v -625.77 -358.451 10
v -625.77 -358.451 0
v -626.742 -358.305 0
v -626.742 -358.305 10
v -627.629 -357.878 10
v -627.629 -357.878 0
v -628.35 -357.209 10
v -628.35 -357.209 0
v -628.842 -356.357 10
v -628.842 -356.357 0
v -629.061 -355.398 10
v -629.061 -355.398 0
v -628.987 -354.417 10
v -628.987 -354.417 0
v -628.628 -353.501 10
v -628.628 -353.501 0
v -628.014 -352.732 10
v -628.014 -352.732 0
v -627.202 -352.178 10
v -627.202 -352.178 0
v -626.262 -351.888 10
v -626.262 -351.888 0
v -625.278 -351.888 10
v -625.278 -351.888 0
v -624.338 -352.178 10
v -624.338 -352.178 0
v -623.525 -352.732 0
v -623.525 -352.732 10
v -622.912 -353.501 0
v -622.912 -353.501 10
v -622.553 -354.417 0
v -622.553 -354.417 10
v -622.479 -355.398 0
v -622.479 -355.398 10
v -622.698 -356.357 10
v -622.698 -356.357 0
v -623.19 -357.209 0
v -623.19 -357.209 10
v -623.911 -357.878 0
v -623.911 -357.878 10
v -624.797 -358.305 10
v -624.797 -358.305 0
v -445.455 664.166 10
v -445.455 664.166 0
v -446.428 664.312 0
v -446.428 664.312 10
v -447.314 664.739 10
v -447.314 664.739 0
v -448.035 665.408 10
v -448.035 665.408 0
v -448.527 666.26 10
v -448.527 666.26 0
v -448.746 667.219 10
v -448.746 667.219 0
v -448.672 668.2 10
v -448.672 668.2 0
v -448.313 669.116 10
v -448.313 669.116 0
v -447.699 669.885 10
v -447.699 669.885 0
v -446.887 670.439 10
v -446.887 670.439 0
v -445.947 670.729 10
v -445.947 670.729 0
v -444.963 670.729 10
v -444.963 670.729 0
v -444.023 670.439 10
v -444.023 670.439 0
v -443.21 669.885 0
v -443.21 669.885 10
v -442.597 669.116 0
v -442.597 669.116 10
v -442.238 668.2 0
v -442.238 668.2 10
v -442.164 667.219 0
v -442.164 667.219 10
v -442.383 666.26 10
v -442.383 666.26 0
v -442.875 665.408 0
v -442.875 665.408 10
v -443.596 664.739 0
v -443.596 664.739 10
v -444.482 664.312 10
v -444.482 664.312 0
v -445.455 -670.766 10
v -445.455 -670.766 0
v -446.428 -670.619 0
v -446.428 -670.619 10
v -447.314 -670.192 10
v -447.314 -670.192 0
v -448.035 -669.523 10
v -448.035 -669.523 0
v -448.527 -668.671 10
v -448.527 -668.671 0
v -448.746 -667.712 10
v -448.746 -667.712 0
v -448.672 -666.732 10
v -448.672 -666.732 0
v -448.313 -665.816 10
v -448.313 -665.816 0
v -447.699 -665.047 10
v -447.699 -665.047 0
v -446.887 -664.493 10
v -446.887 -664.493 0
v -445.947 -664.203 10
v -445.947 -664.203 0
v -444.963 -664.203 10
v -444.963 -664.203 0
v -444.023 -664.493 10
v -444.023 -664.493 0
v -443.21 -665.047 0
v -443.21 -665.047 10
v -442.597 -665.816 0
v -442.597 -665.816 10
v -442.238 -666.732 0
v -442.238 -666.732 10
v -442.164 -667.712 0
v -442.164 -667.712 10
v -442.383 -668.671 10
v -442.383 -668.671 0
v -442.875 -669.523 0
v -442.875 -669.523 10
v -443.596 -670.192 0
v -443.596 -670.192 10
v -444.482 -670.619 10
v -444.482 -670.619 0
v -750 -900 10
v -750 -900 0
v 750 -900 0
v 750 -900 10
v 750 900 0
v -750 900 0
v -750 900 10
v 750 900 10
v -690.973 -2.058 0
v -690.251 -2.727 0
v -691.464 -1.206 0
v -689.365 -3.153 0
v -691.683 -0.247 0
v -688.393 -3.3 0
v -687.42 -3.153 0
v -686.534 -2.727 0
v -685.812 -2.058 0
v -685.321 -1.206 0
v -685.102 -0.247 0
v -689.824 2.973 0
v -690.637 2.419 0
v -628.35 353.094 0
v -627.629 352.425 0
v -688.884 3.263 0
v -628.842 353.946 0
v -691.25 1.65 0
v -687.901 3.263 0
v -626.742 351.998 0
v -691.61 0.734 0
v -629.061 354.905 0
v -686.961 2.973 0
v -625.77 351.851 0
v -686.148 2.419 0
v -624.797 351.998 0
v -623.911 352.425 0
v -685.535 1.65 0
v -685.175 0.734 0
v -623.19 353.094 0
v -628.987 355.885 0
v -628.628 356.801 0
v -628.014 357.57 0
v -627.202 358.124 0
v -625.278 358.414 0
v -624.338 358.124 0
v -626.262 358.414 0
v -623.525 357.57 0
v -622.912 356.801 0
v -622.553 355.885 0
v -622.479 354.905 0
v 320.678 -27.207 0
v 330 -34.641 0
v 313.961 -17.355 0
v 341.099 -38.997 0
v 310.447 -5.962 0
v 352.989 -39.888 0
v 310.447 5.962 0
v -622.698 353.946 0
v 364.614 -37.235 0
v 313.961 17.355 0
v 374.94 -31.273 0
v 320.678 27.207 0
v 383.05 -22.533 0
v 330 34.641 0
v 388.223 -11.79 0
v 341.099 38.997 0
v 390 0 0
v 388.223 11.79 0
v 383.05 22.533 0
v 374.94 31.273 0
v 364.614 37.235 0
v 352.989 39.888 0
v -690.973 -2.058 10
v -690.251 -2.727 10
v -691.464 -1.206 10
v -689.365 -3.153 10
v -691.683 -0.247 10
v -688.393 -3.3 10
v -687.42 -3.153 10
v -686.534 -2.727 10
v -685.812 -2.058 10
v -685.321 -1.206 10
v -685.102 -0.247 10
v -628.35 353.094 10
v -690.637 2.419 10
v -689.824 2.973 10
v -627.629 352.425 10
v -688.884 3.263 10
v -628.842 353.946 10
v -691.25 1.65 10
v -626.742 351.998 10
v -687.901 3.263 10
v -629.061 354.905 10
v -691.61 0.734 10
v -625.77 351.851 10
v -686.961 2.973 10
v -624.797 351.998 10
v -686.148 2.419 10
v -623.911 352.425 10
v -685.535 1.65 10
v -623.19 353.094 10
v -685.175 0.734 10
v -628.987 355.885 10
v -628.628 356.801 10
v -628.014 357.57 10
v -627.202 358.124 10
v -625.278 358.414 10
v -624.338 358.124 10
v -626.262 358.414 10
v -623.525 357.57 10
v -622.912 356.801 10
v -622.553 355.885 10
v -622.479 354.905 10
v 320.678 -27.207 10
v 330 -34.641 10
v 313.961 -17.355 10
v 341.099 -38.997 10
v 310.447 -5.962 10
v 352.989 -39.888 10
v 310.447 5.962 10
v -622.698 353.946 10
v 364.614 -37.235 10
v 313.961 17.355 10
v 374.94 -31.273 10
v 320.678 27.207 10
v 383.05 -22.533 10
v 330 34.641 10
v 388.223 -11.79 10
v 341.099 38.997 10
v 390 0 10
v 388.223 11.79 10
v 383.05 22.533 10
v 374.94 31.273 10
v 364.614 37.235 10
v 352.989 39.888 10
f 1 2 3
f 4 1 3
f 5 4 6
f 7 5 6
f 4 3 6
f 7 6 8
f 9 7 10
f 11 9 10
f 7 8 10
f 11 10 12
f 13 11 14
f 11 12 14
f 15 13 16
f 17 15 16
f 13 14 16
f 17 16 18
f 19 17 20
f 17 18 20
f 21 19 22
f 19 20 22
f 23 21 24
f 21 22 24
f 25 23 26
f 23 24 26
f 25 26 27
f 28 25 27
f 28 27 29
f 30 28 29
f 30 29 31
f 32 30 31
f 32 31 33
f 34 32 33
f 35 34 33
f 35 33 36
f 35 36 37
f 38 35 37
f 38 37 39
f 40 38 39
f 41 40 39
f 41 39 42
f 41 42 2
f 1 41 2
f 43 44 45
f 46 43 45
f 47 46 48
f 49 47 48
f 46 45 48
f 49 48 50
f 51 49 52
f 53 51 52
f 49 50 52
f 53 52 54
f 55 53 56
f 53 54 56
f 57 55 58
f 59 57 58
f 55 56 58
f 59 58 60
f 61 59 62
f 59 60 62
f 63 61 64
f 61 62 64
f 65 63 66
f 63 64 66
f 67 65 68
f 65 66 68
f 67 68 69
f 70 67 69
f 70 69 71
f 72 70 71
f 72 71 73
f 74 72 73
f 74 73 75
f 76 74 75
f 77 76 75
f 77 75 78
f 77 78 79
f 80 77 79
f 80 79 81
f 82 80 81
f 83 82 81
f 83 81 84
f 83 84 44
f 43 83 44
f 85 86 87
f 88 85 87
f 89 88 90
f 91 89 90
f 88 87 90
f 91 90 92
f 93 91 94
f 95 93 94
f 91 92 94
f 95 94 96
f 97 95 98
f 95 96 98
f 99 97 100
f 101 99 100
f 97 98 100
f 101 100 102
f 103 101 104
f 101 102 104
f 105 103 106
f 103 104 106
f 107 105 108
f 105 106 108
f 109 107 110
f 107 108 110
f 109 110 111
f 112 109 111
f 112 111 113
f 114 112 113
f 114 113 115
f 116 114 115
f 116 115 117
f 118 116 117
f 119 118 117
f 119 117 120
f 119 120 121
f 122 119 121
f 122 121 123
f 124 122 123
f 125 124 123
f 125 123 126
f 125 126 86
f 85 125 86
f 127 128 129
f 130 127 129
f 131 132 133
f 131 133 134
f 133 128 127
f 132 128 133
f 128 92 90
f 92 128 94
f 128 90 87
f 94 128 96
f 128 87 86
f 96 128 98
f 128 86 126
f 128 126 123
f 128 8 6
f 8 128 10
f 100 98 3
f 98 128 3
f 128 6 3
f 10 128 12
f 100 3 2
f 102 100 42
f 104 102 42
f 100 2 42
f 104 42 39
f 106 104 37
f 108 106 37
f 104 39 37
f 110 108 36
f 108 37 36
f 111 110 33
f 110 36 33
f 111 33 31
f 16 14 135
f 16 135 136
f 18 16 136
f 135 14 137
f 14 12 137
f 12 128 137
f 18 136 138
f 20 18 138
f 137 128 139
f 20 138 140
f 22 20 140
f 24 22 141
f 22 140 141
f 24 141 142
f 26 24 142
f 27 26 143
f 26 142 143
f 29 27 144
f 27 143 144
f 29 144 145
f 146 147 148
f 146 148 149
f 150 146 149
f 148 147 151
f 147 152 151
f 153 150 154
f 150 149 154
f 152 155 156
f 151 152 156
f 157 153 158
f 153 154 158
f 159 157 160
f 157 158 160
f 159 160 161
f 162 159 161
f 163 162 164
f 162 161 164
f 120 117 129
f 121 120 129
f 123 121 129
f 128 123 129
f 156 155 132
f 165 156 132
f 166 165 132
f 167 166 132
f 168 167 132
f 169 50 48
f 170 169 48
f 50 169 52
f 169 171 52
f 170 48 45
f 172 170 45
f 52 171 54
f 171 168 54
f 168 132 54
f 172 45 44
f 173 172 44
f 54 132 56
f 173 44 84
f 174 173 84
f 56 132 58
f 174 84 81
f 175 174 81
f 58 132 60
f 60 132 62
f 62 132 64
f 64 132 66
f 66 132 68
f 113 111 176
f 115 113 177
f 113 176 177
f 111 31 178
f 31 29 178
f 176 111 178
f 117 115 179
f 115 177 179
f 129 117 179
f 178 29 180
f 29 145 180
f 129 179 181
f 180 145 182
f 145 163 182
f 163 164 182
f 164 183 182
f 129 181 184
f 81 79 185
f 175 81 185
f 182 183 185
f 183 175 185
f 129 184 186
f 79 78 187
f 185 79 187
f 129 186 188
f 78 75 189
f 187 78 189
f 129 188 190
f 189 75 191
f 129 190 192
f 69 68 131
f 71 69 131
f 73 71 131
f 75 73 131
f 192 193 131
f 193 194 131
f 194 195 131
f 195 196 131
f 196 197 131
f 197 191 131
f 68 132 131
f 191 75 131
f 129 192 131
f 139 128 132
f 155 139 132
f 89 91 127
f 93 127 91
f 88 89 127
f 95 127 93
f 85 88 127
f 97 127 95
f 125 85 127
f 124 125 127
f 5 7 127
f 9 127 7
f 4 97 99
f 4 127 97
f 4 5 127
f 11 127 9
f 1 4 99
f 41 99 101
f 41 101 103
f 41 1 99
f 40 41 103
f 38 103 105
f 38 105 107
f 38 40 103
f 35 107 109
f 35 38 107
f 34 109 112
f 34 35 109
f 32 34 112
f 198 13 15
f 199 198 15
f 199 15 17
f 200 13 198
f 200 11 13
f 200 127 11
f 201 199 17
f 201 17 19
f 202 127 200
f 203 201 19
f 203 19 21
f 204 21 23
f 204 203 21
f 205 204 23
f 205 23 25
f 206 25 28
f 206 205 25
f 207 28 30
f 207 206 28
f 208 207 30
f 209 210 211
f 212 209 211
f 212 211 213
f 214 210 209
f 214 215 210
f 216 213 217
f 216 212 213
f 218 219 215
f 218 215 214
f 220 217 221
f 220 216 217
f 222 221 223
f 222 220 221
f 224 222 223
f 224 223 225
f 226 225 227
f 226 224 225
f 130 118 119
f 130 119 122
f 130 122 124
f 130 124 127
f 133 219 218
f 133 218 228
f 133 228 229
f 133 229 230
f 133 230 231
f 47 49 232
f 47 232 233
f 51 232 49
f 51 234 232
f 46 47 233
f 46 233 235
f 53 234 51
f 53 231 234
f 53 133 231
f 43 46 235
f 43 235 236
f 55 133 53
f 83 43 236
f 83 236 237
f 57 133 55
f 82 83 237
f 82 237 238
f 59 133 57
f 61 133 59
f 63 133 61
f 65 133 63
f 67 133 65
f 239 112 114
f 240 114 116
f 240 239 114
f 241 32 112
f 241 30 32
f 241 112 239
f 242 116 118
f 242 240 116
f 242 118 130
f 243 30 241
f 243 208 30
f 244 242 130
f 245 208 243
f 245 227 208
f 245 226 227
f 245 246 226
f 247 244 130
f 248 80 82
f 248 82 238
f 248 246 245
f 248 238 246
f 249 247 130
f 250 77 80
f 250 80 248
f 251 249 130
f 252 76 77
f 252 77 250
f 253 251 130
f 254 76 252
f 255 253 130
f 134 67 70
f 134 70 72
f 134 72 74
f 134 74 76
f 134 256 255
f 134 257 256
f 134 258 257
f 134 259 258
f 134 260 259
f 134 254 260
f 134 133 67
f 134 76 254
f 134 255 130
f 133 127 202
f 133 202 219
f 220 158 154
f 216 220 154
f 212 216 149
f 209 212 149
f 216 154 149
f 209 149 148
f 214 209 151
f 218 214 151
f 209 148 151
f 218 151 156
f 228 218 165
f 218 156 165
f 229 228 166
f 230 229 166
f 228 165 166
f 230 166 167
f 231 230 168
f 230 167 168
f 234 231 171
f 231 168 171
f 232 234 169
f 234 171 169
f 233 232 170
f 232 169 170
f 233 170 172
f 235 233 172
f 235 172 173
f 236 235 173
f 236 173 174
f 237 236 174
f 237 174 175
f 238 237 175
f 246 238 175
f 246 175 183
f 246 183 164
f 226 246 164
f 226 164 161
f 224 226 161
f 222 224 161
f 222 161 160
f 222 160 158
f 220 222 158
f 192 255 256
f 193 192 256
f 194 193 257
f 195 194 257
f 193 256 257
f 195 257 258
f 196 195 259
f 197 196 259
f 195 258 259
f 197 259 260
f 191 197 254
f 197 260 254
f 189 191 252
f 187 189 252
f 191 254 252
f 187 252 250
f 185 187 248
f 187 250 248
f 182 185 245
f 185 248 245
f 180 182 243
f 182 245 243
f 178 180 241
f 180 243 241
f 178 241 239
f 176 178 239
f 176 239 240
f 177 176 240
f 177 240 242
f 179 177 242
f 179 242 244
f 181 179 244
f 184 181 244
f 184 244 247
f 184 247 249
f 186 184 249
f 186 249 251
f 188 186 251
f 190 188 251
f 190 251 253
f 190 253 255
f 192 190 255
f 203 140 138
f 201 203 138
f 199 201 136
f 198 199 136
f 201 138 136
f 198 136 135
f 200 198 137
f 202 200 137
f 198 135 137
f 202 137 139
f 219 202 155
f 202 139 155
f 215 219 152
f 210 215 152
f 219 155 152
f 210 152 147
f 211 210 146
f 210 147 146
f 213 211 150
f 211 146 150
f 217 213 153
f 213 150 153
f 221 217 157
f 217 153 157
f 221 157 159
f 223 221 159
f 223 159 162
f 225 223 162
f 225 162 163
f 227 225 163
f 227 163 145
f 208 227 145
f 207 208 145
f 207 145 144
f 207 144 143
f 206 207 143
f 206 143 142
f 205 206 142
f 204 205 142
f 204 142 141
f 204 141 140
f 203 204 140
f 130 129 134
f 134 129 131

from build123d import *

# Parameters (mm, degrees)
ESBO_O1_W                = 1500
ESBO_O1_H                = 1800
RESSALTO_EXTRUS_O1_DEPTH = 10
ESBO_O2_R                = 40
CORTE_EXTRUS_O1_DEPTH    = 11
FURO_COM_FOLGA_DE_M61_D  = 6.6


with BuildPart() as part:
    # Esboço1 → Ressalto-extrusão1 (new body)
    with BuildSketch(Plane.XY):
        Rectangle(ESBO_O1_W, ESBO_O1_H)
    extrude(amount=RESSALTO_EXTRUS_O1_DEPTH)

    # Esboço2 → Corte-extrusão1 (cut, through all)
    with BuildSketch(Plane.XY.offset(10)):
        with Locations((350, 0)):
            Circle(ESBO_O2_R)
    extrude(amount=-CORTE_EXTRUS_O1_DEPTH, mode=Mode.SUBTRACT)

    # Furo com folga de M61 (through all)
    with Locations(Plane(origin=(350, 0, 16), x_dir=(0, 1, 0), z_dir=(0, 0, 1))):
        with Locations((0, 1038.39252282), (355.151159483, 975.769791173), (667.46584766, 795.454821883), (-355.151159483, 975.769791173), (-667.46584766, 795.454821883)):
            Hole(FURO_COM_FOLGA_DE_M61_D / 2)


solid = part.part
